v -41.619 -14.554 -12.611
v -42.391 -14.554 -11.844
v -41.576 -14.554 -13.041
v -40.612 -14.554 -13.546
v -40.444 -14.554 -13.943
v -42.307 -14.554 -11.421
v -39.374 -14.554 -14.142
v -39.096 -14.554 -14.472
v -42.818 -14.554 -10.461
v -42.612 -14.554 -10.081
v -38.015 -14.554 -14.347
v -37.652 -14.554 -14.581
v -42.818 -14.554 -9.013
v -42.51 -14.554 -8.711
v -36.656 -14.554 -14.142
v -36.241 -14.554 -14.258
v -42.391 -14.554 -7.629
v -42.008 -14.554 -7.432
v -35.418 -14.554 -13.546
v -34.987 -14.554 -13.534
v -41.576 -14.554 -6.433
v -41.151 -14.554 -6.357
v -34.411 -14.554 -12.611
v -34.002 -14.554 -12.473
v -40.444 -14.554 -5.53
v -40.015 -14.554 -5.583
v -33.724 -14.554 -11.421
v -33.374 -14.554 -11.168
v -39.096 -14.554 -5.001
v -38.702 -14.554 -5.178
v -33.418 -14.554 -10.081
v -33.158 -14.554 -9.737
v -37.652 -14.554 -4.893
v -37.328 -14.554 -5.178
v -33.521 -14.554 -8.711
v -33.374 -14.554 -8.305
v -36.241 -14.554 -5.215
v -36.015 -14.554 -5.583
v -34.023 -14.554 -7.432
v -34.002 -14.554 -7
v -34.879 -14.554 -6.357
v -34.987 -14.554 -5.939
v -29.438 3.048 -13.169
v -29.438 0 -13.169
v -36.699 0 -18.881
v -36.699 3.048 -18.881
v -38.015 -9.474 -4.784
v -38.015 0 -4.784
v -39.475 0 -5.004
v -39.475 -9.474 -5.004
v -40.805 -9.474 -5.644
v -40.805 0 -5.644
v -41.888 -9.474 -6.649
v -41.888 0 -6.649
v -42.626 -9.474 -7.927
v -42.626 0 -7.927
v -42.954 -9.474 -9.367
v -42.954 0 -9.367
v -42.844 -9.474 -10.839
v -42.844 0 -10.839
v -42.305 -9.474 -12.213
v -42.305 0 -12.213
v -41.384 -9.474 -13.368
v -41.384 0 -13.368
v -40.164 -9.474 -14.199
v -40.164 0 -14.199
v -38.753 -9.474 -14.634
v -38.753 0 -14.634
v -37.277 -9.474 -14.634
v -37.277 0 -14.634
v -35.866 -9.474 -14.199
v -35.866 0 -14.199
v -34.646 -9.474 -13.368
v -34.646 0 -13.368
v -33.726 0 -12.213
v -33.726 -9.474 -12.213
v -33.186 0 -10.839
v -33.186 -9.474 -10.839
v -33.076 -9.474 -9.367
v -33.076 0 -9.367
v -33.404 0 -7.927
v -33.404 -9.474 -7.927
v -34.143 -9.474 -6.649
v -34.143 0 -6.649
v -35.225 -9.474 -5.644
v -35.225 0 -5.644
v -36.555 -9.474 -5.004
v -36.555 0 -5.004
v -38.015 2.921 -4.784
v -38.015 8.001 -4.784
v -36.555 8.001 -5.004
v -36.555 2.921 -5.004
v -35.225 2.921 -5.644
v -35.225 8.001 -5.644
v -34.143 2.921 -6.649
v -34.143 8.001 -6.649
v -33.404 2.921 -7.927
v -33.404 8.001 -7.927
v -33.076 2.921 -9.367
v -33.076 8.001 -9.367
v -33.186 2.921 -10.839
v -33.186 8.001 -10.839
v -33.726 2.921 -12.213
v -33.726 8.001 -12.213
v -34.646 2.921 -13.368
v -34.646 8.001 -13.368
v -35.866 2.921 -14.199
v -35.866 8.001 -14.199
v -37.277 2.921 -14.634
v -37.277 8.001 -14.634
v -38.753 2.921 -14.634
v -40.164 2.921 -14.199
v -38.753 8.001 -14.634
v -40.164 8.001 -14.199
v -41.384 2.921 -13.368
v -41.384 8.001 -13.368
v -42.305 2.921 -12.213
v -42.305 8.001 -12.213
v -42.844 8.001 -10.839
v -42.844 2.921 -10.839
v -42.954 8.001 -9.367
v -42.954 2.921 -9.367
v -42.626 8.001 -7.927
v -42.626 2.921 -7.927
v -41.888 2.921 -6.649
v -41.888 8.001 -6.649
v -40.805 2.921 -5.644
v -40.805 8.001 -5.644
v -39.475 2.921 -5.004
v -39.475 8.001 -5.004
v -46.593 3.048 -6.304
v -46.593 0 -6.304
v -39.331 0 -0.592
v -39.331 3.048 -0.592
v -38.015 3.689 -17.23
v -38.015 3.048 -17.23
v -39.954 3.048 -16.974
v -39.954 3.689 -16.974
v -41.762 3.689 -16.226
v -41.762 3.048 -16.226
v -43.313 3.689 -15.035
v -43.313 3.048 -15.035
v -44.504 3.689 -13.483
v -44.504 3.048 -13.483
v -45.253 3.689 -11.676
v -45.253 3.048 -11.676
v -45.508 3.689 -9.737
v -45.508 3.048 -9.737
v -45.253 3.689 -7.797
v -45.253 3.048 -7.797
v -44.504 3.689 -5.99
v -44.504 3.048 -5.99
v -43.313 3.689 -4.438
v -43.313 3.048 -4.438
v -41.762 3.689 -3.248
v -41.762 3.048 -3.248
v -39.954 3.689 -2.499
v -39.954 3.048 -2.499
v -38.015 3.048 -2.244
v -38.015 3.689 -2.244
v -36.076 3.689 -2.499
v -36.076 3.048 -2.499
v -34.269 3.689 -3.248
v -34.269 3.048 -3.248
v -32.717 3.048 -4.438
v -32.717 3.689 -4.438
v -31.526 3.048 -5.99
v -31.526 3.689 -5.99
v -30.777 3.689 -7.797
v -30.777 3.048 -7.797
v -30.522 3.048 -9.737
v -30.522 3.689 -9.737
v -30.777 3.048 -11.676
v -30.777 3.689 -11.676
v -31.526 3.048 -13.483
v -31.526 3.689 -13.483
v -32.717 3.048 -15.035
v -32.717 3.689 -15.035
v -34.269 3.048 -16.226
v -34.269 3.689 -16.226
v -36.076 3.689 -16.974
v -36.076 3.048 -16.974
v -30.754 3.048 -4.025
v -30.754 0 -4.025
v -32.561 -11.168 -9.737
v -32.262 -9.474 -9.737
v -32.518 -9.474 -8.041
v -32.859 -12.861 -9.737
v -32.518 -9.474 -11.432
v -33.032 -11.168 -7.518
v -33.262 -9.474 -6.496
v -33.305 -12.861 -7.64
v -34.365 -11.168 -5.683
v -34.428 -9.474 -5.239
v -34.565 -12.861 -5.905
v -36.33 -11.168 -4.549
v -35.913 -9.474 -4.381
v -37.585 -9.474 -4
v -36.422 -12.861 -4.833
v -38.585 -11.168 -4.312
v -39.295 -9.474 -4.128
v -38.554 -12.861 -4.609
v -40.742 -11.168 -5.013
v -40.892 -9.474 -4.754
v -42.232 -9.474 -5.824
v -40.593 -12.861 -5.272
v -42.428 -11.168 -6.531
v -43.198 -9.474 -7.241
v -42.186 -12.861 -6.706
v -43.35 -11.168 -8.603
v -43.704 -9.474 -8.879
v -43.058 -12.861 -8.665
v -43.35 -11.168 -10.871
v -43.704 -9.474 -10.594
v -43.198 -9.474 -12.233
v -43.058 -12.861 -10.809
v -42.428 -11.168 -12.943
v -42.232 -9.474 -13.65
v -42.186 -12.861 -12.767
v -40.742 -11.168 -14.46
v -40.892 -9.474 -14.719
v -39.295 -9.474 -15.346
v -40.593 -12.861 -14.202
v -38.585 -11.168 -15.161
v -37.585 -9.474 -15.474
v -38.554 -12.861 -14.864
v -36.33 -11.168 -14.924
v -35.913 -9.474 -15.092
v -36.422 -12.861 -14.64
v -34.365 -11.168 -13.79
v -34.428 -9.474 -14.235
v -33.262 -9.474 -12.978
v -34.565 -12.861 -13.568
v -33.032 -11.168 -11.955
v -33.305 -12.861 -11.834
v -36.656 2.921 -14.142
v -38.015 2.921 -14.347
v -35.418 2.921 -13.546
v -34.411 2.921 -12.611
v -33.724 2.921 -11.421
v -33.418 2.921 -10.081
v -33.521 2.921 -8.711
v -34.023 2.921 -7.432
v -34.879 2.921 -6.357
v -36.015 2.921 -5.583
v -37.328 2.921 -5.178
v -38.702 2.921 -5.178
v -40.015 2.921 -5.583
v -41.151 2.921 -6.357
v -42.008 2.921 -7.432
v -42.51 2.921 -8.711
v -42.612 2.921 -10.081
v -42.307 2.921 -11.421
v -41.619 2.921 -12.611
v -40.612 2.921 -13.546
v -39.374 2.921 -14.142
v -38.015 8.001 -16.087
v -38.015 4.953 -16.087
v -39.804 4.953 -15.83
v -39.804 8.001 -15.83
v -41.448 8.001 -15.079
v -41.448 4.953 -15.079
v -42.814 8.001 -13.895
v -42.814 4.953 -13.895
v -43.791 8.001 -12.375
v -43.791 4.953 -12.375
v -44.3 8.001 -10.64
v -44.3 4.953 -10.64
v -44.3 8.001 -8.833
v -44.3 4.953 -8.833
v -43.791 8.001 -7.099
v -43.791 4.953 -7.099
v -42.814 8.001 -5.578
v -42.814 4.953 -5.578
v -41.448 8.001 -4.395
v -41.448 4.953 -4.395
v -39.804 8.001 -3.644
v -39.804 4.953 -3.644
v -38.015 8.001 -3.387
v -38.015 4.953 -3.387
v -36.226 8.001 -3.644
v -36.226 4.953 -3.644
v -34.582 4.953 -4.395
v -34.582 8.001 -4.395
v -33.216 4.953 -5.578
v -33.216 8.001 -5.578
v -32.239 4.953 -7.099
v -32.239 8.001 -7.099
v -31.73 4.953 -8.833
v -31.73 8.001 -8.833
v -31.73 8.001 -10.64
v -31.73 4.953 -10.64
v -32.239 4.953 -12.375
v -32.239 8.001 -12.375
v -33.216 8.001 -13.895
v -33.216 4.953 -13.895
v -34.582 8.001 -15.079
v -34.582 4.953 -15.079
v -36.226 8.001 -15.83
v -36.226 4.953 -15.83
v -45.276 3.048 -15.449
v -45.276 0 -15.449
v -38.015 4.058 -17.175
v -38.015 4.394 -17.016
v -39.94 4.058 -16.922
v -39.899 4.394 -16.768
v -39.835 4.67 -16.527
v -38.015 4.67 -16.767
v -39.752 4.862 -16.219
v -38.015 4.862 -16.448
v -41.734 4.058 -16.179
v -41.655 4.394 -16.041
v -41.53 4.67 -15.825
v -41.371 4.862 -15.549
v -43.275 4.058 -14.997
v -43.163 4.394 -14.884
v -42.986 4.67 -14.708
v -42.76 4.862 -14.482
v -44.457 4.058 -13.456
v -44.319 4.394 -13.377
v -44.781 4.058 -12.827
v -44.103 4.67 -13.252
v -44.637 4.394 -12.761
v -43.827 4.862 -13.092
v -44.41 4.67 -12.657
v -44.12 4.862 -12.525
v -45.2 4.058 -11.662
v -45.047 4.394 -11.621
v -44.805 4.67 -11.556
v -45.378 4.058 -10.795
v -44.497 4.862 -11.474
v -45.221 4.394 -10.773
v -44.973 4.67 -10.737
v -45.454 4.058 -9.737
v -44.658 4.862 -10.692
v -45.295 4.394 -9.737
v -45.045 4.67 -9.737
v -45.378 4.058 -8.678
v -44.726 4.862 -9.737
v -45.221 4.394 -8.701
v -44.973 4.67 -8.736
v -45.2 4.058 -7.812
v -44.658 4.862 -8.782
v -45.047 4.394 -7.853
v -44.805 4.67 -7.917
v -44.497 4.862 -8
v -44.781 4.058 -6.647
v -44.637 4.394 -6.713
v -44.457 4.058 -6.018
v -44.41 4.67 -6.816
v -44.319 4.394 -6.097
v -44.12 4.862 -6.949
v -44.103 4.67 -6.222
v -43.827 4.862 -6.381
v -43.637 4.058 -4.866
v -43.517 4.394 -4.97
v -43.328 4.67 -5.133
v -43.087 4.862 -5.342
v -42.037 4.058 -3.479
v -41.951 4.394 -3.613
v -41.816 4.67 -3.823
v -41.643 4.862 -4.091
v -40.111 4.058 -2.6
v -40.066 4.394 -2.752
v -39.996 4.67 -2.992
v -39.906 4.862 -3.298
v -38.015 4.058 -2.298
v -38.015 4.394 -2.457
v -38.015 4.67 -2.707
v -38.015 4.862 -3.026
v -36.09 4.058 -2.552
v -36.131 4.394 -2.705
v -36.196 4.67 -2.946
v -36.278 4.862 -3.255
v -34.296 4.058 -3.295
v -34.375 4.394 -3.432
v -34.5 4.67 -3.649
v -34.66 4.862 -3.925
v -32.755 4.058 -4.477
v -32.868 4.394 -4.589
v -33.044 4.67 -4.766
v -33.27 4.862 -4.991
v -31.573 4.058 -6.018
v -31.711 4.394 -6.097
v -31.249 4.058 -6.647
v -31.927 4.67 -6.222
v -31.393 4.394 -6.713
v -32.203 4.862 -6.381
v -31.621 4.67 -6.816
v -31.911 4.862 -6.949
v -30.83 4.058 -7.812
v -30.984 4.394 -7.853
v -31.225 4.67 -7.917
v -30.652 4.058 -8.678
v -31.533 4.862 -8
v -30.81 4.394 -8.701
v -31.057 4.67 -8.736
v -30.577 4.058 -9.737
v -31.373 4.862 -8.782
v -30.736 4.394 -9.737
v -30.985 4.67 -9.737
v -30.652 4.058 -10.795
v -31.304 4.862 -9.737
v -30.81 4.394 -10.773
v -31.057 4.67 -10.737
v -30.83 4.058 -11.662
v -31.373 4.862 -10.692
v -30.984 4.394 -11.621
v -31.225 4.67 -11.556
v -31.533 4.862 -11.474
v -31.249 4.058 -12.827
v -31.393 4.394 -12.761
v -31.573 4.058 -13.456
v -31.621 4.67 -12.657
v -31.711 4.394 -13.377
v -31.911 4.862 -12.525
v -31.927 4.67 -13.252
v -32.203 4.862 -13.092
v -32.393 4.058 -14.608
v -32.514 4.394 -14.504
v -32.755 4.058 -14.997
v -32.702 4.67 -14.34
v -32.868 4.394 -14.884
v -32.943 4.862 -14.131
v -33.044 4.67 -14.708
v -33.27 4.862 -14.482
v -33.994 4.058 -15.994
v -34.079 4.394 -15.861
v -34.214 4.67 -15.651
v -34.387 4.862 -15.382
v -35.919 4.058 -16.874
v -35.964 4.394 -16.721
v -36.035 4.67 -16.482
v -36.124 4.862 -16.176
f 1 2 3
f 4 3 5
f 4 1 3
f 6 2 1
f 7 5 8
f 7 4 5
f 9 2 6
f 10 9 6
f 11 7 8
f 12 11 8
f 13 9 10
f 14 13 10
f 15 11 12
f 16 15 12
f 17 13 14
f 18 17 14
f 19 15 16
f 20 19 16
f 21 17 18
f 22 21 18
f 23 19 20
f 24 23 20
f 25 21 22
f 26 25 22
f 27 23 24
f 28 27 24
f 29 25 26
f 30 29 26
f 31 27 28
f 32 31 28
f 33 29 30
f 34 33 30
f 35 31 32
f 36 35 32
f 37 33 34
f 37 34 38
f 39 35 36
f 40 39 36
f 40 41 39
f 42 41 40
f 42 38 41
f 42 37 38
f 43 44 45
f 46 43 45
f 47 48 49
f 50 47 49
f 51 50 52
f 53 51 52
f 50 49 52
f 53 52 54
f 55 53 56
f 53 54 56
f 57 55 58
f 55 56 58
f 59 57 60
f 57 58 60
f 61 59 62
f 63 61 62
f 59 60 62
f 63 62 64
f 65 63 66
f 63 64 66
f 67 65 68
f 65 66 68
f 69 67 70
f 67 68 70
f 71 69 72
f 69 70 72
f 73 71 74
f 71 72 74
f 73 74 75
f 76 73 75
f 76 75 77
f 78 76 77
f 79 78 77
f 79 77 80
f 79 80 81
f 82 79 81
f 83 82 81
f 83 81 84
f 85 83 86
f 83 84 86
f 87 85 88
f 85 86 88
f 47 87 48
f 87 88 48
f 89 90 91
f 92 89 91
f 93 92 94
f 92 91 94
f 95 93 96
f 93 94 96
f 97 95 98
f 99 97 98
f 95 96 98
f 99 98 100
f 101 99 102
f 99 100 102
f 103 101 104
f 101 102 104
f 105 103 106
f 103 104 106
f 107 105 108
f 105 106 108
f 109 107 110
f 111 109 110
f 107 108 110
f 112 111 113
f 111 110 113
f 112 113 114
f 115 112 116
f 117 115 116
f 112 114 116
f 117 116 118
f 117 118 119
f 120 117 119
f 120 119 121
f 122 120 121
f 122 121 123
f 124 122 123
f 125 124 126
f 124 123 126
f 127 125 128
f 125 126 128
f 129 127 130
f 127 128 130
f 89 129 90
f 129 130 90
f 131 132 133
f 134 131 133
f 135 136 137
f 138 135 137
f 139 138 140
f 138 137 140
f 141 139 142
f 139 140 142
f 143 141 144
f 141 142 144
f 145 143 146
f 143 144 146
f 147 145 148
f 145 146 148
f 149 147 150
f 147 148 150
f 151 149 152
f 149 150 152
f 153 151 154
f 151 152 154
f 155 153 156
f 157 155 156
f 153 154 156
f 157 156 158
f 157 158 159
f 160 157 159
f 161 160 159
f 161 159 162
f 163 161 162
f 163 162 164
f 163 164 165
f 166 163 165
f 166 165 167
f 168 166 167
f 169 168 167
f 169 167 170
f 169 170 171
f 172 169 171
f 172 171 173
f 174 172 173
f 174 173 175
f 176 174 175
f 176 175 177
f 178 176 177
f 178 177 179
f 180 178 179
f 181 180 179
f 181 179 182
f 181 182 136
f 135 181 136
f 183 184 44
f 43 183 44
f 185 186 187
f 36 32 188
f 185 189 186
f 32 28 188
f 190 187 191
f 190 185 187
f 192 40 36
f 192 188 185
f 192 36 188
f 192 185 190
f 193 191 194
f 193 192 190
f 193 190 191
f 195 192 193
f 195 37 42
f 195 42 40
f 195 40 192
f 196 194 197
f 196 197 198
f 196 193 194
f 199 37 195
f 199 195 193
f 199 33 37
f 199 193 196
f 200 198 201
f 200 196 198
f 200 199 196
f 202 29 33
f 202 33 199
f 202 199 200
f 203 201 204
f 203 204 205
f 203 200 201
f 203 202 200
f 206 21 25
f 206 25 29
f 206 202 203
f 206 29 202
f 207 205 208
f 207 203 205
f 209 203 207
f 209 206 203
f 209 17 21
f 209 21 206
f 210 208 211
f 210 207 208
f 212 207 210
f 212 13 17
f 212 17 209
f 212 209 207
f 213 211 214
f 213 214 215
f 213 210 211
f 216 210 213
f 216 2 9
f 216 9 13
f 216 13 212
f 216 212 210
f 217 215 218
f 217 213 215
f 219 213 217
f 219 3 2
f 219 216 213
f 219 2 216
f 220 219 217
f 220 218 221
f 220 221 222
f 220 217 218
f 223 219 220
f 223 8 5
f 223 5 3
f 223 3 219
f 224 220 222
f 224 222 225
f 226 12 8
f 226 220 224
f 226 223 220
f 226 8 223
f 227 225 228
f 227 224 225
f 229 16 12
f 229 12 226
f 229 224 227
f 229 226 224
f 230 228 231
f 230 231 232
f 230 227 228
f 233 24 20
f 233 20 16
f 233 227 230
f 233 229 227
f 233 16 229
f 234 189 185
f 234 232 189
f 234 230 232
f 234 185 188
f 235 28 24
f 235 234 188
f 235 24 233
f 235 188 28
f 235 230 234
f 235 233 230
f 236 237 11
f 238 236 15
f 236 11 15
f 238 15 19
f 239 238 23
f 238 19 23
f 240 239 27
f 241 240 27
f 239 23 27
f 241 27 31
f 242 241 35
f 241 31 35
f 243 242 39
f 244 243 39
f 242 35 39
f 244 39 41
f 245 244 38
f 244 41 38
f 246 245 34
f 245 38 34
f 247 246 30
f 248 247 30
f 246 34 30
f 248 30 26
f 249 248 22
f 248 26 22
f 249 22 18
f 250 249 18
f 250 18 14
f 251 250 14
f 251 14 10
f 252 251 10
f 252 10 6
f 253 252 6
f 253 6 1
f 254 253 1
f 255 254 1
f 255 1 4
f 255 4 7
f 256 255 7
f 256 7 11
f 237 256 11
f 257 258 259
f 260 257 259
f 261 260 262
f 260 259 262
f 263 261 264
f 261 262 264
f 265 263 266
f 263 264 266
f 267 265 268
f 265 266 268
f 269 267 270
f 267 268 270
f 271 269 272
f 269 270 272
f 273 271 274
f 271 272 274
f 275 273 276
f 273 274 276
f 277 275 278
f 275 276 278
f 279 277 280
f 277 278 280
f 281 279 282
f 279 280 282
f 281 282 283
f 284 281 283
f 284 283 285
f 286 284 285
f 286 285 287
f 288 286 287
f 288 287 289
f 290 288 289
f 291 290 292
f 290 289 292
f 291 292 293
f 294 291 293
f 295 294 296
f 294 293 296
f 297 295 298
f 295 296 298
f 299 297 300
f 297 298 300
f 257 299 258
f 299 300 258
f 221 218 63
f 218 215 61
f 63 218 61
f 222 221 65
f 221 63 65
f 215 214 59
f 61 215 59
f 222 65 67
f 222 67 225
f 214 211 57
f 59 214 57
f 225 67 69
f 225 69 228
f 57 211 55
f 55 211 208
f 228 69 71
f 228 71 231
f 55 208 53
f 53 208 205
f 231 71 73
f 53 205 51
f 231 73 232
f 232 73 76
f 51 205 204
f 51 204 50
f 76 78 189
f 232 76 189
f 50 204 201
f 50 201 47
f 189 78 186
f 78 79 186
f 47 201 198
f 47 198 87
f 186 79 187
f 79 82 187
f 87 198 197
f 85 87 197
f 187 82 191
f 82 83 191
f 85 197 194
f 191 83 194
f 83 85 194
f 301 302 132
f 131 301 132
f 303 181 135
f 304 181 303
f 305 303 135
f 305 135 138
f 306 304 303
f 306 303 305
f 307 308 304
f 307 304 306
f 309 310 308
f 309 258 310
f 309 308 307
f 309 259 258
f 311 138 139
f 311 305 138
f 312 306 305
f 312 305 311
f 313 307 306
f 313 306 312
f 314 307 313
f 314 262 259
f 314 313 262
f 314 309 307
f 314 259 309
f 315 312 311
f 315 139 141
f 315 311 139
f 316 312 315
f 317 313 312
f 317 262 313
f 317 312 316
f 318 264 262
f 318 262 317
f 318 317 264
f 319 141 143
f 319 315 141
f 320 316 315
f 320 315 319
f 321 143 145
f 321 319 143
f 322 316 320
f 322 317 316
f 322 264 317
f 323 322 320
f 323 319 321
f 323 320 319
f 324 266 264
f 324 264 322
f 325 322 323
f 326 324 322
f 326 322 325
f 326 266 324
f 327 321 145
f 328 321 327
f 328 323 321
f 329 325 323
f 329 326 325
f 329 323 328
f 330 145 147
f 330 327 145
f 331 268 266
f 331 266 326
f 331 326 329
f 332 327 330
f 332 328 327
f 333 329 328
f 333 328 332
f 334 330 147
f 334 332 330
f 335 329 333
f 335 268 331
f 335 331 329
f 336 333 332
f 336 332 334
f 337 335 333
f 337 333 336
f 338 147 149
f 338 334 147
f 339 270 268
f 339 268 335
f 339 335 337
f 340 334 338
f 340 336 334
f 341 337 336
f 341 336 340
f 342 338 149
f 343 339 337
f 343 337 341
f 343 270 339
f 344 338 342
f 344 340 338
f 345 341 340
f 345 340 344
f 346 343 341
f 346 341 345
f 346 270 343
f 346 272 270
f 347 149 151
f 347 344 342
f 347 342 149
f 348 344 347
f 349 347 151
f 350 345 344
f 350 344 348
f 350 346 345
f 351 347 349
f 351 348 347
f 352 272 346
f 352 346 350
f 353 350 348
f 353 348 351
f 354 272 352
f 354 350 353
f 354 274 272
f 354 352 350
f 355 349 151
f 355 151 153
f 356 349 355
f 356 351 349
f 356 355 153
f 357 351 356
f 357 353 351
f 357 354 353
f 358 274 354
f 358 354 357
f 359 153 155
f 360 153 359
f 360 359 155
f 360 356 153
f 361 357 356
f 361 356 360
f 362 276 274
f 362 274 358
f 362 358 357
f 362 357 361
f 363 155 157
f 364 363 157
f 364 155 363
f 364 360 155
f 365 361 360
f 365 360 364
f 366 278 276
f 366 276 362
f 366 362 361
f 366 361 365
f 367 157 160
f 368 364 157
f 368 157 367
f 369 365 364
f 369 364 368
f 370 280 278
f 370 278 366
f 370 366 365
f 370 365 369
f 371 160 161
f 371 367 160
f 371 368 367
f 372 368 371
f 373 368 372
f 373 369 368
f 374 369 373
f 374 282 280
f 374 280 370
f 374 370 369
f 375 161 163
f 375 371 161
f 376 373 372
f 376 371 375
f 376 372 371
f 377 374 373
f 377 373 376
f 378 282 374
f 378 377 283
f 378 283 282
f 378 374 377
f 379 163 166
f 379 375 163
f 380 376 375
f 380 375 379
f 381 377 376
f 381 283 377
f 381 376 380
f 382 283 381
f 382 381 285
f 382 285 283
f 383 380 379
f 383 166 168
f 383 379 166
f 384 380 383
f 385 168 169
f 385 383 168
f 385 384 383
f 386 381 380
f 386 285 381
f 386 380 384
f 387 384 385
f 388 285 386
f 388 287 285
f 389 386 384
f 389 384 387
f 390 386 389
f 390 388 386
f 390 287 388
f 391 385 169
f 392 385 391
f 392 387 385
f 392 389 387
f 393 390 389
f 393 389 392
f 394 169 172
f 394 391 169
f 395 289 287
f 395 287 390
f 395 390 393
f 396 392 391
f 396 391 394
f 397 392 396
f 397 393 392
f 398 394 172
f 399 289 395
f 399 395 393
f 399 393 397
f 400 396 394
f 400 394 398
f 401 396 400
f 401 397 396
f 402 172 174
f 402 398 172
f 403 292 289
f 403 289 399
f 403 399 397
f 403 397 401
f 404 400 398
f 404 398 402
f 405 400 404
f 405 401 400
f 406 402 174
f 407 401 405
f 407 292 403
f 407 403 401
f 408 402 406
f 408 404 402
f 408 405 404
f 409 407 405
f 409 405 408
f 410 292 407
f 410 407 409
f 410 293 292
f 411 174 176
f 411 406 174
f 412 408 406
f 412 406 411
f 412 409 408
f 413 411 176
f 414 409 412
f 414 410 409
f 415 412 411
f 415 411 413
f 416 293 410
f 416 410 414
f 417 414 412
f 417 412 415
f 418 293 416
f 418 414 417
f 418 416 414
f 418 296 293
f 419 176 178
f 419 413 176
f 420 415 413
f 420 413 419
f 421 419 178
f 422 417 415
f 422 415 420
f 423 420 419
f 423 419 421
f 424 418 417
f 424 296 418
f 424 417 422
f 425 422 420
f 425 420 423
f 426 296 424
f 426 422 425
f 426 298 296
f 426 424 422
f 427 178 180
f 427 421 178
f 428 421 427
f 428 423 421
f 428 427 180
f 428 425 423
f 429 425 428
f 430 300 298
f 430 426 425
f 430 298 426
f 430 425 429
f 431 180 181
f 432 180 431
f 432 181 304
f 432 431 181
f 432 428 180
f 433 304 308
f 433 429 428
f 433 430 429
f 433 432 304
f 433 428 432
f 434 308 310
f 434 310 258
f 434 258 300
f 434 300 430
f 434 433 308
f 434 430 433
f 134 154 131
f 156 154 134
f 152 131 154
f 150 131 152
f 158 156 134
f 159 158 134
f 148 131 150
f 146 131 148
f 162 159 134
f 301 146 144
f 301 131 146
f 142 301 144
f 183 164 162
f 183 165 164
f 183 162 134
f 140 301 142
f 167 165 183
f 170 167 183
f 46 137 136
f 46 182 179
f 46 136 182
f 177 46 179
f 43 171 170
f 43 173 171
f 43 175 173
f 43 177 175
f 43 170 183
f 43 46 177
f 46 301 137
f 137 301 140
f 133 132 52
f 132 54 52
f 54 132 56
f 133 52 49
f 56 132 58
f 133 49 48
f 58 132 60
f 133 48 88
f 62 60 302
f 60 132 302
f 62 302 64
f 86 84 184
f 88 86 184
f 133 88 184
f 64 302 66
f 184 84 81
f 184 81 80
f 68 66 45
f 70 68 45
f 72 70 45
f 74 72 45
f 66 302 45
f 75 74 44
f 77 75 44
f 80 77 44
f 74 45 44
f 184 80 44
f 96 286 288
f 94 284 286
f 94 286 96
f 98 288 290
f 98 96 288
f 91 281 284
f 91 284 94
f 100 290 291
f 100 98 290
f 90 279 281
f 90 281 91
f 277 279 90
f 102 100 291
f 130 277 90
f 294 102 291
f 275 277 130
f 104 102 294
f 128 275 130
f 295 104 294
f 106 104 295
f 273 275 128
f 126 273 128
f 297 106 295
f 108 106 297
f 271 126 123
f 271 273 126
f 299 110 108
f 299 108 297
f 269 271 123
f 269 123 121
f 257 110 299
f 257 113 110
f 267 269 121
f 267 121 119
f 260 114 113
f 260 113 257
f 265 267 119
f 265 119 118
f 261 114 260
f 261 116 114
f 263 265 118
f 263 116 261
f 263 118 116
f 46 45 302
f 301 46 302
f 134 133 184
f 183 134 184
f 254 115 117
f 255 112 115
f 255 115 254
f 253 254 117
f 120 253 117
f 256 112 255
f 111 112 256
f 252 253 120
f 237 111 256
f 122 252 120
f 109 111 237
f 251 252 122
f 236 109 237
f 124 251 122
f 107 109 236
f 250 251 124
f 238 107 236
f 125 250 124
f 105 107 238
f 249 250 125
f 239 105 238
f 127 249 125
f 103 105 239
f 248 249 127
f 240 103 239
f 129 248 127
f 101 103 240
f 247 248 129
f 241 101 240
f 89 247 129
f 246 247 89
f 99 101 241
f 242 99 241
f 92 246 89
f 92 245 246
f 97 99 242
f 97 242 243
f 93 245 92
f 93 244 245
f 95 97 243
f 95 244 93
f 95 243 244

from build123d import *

# Parameters (mm, degrees)
BOSS_EXTRUDE1_DEPTH = 3.048
SKETCH2_R           = 7.493
BOSS_EXTRUDE2_DEPTH = 1.905
SKETCH3_R           = 6.35
BOSS_EXTRUDE3_DEPTH = 3.048
SKETCH5_R           = 4.953
BOSS_EXTRUDE4_DEPTH = 9.4742
SKETCH6_R           = 5.7531
BOSS_EXTRUDE5_DEPTH = 5.08
BOSS_EXTRUDE5_TAPER = 10
FILLET3_R           = 1.27
SKETCH9_R           = 4.6101
CUT_EXTRUDE2_DEPTH  = 56.100911289
SKETCH10_R          = 4.953
CUT_EXTRUDE3_DEPTH  = 5.08


with BuildPart() as part:
    # Sketch1 → Boss-Extrude1 (new body)
    with BuildSketch(Plane(origin=(0, 0, 0), x_dir=(1, 0, 0), z_dir=(0, 1, 0))):
        Polygon((-30.753854436, 4.024561232), (-29.437584499, 13.169073327), (-36.69882931, 18.881252578), (-45.276344058, 15.448919735), (-46.592613995, 6.30440764), (-39.331369184, 0.592228389), align=None)
    extrude(amount=BOSS_EXTRUDE1_DEPTH)

    # Sketch2 → Boss-Extrude2 (add)
    with BuildSketch(Plane(origin=(0, 3.048, 0), x_dir=(1, 0, 0), z_dir=(0, 1, 0))):
        with Locations(Location((-38.015099247, 9.736740484, 0), (0, 0, 90))):
            Circle(SKETCH2_R)
    extrude(amount=BOSS_EXTRUDE2_DEPTH)

    # Sketch3 → Boss-Extrude3 (add)
    with BuildSketch(Plane(origin=(0, 4.953, 0), x_dir=(1, 0, 0), z_dir=(0, 1, 0))):
        with Locations(Location((-38.015099247, 9.736740484, 0), (0, 0, 90))):
            Circle(SKETCH3_R)
    extrude(amount=BOSS_EXTRUDE3_DEPTH)

    # Sketch5 → Boss-Extrude4 (add)
    with BuildSketch(Plane.XZ):
        with Locations(Location((-38.015099247, -9.736740484, 0), (0, 0, 90))):
            Circle(SKETCH5_R)
    extrude(amount=BOSS_EXTRUDE4_DEPTH)

    # Sketch6 → Boss-Extrude5 (add)
    with BuildSketch(Plane.XZ.offset(9.4742)):
        with Locations((-38.015099247, -9.736740484)):
            Circle(SKETCH6_R)
    extrude(amount=BOSS_EXTRUDE5_DEPTH, taper=BOSS_EXTRUDE5_TAPER)

    # Fillet3
    # the kernel refuses this fillet: 1.27 mm, written as the material it takes off along each edge
    with BuildSketch(Plane(origin=(-38.015099247, 4.953, -9.736740484), x_dir=(0, 0, -1), z_dir=(1, 0, 0))) as fillet3_piece_1:
        with BuildLine():
            CenterArc((6.223, -1.263634045), FILLET3_R, 0, 84.260829523)
            Line((6.35, 0), (6.35254, 0.025272681))
            ThreePointArc((6.35254, 0.025272681), (6.9215, 0.0254), (7.493, 0.0254))
            Line((7.493, 0.0254), (7.5184, 0))
            Line((7.5184, 0), (7.5184, -1.263634045))
            Line((7.5184, -1.263634045), (7.493, -1.263634045))
        make_face()
    revolve(axis=Axis((-38.015099247, 4.953, -9.736740484), (0, 1, 0)), mode=Mode.SUBTRACT)

    # Sketch9 → Cut-Extrude2 (cut, through all)
    with BuildSketch(Plane.XZ.offset(14.5542)):
        with Locations(Location((-38.015099247, -9.736740484, 0), (0, 0, 270))):
            Circle(SKETCH9_R)
    extrude(amount=-CUT_EXTRUDE2_DEPTH, mode=Mode.SUBTRACT)

    # Sketch10 → Cut-Extrude3 (cut)
    with BuildSketch(Plane(origin=(0, 8.001, 0), x_dir=(1, 0, 0), z_dir=(0, 1, 0))):
        with Locations(Location((-38.015099247, 9.736740484, 0), (0, 0, 270))):
            Circle(SKETCH10_R)
    extrude(amount=-CUT_EXTRUDE3_DEPTH, mode=Mode.SUBTRACT)


solid = part.part
